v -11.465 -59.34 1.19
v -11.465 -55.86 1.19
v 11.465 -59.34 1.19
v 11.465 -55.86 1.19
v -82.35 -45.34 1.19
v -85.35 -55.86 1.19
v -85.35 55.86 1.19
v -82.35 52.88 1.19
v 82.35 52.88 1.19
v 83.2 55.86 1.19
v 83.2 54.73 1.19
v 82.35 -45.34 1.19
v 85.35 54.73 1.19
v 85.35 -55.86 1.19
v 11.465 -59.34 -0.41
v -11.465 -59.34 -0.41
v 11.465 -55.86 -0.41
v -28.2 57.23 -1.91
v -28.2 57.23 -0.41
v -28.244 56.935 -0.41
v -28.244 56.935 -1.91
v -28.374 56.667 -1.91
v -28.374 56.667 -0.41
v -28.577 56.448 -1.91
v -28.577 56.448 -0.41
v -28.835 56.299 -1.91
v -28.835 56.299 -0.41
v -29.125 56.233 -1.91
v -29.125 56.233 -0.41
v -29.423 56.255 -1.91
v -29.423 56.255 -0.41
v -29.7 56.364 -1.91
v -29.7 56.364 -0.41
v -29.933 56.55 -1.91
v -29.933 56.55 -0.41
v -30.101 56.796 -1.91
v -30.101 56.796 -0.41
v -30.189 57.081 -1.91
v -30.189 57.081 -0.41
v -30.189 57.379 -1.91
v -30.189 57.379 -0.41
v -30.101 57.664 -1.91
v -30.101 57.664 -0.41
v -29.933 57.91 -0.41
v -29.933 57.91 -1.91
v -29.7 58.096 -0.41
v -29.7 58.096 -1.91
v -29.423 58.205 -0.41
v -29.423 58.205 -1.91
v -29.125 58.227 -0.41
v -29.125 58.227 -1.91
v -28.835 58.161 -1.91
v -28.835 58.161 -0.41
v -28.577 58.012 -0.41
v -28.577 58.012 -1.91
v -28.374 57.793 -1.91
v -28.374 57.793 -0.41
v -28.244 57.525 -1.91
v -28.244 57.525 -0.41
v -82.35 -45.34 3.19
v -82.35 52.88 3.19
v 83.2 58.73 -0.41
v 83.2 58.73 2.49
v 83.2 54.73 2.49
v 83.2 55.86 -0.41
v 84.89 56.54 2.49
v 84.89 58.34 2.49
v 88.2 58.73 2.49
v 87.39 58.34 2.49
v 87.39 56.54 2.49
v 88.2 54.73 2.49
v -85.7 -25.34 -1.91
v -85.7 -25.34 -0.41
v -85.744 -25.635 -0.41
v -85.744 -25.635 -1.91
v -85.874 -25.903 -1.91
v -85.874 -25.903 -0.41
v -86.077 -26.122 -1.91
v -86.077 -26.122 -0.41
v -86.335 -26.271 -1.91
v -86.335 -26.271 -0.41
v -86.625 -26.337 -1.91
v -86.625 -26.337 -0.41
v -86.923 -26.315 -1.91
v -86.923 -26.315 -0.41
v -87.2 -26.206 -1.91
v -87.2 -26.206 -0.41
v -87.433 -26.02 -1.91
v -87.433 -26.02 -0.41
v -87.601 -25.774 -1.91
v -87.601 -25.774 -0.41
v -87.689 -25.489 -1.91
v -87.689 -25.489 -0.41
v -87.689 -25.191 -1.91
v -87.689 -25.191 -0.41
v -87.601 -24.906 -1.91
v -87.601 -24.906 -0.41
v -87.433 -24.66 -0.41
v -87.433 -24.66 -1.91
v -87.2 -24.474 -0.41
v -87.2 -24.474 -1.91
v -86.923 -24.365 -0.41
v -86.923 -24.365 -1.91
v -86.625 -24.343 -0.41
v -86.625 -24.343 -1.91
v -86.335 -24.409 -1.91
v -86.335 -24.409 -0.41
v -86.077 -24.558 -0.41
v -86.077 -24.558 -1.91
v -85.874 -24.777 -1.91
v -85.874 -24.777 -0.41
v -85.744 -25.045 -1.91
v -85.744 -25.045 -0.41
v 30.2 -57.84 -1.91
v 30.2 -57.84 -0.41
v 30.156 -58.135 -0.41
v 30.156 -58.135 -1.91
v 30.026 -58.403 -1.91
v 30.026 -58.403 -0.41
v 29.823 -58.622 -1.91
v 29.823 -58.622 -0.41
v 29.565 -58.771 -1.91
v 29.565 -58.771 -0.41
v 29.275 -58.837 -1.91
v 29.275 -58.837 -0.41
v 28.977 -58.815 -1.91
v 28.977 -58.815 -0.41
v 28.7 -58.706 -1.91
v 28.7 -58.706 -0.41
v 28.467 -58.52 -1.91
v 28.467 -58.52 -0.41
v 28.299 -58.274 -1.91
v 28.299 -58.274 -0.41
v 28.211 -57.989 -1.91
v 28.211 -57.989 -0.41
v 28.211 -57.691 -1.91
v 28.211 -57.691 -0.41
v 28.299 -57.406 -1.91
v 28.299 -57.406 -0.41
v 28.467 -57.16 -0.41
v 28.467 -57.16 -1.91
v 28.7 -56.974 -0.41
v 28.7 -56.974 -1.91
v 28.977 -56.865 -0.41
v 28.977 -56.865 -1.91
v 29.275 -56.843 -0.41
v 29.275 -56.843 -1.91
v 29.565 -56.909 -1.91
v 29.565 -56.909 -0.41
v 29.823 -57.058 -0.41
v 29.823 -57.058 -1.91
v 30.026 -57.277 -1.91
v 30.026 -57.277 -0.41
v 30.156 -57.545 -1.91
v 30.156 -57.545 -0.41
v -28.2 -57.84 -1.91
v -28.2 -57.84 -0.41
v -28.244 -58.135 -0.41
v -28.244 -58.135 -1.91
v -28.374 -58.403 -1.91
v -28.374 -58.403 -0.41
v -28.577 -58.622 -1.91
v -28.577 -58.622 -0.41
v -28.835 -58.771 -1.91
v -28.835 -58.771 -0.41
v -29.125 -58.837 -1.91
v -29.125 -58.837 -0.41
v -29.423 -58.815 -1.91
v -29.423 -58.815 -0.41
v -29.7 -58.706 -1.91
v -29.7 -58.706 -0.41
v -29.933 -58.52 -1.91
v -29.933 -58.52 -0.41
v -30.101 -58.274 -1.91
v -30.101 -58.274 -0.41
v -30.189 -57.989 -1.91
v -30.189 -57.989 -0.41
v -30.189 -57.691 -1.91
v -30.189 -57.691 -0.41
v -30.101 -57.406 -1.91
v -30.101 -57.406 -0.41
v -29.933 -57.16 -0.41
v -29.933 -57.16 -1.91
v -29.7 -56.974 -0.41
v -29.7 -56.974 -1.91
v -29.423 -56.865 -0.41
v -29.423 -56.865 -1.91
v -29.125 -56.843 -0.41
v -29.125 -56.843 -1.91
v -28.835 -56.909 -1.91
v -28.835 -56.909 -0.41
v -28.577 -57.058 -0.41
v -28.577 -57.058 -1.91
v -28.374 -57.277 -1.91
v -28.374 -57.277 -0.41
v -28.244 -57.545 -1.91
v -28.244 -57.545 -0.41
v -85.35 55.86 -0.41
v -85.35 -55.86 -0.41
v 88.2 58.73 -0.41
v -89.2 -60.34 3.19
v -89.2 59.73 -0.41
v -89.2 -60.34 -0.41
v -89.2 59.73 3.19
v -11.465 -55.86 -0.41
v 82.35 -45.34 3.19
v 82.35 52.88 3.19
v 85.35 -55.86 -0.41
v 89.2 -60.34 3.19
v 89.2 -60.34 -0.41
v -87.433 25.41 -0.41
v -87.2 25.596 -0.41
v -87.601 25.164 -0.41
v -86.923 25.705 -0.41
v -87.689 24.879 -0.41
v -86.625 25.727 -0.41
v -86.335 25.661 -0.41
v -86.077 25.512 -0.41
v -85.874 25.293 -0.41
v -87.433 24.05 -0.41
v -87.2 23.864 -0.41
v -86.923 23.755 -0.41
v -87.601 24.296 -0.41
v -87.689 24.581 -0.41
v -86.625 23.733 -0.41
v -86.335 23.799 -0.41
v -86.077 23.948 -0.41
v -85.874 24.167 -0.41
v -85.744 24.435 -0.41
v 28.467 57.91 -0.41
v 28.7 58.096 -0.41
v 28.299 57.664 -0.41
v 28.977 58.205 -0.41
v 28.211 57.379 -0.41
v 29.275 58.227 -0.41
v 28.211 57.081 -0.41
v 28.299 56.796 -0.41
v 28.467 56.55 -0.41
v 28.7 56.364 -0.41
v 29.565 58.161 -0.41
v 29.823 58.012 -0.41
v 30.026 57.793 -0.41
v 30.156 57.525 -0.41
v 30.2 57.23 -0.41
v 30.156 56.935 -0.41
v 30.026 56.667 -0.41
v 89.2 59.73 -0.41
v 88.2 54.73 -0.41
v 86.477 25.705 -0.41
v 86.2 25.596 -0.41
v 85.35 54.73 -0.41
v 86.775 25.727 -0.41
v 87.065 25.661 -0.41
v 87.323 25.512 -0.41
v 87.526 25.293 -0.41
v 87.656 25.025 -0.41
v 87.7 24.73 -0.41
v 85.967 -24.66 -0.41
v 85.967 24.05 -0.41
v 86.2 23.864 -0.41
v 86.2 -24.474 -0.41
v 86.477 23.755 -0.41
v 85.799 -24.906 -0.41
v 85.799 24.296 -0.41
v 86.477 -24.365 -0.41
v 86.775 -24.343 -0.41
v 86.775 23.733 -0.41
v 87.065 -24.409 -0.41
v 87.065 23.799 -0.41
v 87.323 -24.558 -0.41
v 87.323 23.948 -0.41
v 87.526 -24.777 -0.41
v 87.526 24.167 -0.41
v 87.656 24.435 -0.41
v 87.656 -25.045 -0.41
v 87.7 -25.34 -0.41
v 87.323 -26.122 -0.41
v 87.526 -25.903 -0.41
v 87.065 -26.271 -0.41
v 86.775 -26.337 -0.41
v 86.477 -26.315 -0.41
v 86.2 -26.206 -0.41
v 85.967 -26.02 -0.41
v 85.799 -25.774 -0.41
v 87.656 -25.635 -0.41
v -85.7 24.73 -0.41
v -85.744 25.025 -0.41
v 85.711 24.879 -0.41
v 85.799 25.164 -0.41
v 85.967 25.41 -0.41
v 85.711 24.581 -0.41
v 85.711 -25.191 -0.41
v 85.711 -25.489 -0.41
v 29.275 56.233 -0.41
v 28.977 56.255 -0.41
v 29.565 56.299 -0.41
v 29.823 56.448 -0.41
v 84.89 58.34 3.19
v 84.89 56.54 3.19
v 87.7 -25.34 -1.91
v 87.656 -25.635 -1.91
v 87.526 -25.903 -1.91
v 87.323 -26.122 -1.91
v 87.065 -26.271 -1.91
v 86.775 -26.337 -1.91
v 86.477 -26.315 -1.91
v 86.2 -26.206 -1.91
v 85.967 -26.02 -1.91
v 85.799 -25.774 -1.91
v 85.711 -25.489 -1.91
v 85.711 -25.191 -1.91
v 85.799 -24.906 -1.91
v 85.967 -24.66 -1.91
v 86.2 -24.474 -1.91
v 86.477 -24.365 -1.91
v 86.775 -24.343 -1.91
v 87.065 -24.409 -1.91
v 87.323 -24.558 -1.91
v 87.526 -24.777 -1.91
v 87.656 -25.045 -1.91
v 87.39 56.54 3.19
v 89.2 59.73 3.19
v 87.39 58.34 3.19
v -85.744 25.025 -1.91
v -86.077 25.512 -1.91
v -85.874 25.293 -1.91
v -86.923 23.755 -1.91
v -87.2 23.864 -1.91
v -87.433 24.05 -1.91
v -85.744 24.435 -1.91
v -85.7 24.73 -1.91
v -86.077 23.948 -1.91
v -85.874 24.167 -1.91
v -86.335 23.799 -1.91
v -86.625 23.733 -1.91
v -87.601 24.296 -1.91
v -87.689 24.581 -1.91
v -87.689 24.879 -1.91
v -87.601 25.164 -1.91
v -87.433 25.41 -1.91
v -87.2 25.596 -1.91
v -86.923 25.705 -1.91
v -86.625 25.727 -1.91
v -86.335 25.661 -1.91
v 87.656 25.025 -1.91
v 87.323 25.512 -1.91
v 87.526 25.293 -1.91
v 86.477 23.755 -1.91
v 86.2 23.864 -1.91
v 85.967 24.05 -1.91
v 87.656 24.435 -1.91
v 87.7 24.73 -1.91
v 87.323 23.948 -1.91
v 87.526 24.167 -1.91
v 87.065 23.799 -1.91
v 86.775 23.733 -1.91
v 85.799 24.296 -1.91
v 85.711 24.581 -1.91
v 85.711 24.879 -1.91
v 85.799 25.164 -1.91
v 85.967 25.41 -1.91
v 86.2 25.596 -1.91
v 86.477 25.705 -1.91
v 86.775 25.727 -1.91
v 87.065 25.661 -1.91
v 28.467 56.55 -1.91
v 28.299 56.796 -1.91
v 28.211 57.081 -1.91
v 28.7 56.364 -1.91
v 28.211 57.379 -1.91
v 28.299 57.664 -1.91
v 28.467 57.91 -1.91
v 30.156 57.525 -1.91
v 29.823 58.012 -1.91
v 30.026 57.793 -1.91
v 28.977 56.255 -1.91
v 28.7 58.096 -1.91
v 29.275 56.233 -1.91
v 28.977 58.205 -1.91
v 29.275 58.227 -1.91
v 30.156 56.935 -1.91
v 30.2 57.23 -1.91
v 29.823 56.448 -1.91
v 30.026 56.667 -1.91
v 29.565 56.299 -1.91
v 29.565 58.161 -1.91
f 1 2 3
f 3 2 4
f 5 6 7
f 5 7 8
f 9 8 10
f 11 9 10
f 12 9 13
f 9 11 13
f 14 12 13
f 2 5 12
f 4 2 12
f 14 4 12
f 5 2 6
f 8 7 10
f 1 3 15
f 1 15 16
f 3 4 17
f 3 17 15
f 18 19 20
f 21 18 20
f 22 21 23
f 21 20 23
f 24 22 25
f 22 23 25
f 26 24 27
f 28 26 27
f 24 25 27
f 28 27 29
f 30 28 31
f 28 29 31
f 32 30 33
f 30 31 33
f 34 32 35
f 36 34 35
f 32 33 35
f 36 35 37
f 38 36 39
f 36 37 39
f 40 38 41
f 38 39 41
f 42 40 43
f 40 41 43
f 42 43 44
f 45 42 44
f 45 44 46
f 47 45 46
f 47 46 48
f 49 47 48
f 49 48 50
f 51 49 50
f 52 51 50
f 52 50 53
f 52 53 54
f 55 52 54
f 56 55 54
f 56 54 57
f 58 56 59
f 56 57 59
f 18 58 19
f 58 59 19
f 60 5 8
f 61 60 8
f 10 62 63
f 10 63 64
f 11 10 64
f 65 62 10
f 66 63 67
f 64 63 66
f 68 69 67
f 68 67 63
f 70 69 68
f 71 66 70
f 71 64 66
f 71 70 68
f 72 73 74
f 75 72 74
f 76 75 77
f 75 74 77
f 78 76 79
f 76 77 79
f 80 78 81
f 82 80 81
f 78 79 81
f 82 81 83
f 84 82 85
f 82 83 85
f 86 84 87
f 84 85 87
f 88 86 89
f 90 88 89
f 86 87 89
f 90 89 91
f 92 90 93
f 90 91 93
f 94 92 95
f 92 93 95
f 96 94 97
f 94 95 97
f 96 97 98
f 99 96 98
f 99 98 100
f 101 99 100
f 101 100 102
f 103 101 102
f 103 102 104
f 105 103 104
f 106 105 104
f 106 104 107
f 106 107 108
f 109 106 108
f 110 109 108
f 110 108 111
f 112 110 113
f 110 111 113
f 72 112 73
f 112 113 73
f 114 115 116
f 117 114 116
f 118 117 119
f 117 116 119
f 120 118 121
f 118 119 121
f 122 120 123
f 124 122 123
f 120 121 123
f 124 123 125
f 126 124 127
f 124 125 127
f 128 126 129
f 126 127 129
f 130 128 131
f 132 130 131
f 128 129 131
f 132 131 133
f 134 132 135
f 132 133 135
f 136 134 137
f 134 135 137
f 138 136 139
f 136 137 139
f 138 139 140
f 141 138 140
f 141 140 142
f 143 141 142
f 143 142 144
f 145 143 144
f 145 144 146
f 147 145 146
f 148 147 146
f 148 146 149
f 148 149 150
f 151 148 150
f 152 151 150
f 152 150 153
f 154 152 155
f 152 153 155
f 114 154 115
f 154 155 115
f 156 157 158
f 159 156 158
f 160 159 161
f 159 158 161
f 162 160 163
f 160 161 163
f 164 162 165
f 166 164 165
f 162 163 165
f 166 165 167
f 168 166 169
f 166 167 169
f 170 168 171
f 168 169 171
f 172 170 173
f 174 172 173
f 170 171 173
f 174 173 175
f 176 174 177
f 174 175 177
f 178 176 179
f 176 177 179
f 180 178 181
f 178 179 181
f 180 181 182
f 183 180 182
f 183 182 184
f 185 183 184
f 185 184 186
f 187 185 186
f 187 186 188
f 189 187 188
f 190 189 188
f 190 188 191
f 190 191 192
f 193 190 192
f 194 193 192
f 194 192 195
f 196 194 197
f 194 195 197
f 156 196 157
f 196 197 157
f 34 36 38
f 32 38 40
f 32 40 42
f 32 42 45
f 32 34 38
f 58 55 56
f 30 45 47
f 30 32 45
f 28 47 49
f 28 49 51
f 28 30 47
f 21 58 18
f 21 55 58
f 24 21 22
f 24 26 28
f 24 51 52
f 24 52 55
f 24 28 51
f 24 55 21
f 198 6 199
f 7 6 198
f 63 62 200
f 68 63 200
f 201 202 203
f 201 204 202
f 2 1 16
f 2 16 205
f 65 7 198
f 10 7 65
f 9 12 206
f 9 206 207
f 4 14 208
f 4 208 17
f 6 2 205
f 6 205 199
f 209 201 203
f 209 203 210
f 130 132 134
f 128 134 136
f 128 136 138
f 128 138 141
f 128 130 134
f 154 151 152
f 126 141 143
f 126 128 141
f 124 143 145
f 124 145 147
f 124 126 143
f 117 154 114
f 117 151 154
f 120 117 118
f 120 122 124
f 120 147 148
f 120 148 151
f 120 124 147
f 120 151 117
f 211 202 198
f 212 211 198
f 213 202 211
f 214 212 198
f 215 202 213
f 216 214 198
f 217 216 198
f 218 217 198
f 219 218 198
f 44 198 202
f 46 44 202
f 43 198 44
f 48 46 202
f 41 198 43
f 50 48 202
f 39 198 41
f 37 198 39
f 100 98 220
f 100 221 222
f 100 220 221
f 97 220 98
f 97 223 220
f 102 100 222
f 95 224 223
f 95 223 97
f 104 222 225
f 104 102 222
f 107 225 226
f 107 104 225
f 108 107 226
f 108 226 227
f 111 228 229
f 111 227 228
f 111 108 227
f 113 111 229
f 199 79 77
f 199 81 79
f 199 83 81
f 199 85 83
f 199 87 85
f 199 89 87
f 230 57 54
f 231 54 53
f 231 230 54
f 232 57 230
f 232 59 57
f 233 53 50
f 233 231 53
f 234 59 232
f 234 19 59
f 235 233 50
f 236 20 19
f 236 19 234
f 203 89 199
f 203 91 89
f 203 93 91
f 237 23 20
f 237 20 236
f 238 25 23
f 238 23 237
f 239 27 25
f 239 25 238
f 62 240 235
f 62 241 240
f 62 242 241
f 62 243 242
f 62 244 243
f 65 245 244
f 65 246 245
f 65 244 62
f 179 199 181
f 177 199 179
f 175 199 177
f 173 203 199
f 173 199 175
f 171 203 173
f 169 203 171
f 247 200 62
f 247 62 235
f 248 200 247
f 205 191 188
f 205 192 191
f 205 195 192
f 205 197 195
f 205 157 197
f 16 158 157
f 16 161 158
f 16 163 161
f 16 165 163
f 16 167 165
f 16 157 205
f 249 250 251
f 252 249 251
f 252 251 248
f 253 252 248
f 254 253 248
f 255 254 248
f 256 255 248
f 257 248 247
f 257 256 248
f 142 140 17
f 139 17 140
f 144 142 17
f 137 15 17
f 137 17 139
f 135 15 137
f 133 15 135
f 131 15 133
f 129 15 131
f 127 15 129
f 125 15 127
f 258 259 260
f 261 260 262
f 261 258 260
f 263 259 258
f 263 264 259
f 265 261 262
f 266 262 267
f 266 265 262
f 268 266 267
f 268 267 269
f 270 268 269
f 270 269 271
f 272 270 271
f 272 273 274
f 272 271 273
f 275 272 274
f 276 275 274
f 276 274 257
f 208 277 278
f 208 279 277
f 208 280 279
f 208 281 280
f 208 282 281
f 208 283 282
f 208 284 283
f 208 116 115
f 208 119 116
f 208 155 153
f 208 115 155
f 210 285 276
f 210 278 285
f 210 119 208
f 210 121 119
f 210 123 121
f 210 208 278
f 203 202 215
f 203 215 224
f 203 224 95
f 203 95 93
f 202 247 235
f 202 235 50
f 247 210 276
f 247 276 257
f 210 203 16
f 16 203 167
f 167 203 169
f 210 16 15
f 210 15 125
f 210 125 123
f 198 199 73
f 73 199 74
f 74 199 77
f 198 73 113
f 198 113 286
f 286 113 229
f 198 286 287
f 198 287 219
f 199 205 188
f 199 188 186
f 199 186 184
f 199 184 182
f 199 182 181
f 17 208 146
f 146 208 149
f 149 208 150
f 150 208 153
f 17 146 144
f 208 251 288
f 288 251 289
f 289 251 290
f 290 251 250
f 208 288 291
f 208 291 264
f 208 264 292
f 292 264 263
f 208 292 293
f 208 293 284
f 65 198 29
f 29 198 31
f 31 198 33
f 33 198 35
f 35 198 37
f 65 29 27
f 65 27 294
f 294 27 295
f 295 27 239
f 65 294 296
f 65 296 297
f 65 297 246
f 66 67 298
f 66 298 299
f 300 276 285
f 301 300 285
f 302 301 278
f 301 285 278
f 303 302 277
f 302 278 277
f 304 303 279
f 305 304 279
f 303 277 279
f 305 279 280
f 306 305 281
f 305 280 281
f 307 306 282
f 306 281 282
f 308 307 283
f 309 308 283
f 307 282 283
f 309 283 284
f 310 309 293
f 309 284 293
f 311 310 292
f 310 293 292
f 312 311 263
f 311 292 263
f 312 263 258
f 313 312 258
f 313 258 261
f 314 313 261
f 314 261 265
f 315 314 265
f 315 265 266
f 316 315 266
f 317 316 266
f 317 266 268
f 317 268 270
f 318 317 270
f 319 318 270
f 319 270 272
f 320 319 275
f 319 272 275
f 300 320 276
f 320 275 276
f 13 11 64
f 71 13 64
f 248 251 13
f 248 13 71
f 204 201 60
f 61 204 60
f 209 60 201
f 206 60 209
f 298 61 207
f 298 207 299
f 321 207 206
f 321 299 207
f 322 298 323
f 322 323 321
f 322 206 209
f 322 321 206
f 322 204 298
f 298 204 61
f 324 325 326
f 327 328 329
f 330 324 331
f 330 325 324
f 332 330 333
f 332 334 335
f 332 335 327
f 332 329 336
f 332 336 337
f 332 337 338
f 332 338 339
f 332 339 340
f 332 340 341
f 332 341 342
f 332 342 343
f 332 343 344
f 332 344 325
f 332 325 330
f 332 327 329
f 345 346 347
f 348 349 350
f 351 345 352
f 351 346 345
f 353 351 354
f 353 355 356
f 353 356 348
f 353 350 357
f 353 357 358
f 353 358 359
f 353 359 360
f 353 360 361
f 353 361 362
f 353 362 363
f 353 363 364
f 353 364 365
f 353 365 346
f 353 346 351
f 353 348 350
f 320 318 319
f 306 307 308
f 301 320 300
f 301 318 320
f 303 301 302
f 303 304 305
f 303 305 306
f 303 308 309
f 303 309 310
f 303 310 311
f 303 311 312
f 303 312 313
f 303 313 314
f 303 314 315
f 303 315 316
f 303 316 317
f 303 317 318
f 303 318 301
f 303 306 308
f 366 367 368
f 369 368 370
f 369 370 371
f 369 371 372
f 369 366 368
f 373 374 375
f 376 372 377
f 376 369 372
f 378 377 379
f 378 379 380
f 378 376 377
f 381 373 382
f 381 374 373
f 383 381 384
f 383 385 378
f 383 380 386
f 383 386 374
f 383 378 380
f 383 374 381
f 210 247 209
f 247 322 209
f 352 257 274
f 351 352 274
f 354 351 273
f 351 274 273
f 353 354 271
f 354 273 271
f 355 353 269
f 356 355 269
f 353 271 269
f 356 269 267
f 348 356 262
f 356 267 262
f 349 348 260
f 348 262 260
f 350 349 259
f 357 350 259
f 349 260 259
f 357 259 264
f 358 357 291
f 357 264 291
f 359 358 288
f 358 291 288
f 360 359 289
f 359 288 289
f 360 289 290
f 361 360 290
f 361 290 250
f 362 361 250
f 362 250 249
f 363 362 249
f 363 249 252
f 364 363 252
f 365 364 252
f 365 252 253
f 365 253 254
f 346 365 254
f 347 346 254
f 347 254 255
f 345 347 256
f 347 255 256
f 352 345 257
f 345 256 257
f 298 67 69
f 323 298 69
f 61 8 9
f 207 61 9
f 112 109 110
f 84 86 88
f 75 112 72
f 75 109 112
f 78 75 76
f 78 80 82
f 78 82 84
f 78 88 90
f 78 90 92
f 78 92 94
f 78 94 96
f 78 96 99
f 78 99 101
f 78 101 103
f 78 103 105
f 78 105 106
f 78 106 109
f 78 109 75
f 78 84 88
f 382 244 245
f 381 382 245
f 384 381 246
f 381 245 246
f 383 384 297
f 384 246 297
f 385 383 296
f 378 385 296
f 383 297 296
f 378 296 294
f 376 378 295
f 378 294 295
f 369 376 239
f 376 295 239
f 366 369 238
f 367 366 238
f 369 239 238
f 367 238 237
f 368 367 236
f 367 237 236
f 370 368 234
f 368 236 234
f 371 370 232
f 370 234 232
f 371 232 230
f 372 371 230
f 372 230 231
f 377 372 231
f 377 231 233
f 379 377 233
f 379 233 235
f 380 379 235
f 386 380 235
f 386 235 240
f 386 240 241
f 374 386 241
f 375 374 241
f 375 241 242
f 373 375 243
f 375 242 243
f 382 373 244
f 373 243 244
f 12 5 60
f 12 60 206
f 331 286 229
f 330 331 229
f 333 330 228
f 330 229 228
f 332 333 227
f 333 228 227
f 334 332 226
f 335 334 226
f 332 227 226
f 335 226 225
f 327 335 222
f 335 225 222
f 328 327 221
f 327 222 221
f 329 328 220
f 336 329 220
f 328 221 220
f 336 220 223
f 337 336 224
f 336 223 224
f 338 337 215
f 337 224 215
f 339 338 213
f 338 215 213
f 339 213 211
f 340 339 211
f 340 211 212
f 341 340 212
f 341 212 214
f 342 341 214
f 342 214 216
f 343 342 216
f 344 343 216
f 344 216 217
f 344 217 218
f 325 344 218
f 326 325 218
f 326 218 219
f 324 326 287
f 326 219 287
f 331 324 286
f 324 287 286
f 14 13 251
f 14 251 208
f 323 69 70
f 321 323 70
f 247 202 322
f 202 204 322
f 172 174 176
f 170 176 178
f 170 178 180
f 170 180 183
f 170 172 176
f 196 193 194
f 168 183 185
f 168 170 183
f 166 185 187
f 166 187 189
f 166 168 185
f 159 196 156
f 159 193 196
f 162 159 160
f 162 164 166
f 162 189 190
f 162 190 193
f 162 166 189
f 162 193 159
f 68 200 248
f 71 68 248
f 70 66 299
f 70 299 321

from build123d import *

# Parameters (mm, degrees)
SKETCH001_W     = 178.4
SKETCH001_H     = 120.07
SKETCH001_W_2   = 164.7
SKETCH001_H_2   = 98.22
PAD_DEPTH       = 2
SKETCH_W        = 178.4
SKETCH_H        = 120.07
PAD001_DEPTH    = 1.6
SKETCH009_W     = 5
SKETCH009_H     = 4
POCKET_DEPTH    = 2.9
SKETCH010_W     = 2.5
SKETCH010_H     = 1.8
POCKET001_DEPTH = 5
SKETCH011_R     = 1
PAD009_DEPTH    = 1.5


with BuildPart() as part:
    # Sketch001 (on Face45 of Binder) → Pad (new body)
    with BuildSketch(Plane.XY.offset(1.19)):
        with Locations((0, -0.305)):
            Rectangle(SKETCH001_W, SKETCH001_H)
        with Locations((0, 3.77)):
            Rectangle(SKETCH001_W_2, SKETCH001_H_2, mode=Mode.SUBTRACT)
    extrude(amount=PAD_DEPTH)

    # Sketch (on Face9 of Pad) → Pad001 (join)
    with BuildSketch(Plane(origin=(0, 0, 1.19), x_dir=(1, 0, 0), z_dir=(0, 0, -1))):
        with Locations((0, 0.305)):
            Rectangle(SKETCH_W, SKETCH_H)
        Polygon((-85.35, 55.86), (-85.35, -55.86), (85.35, -55.86), (85.35, 55.86), (11.4649, 55.86), (11.4649, 59.34), (-11.4649, 59.34), (-11.4649, 55.86), align=None, mode=Mode.SUBTRACT)
    extrude(amount=PAD001_DEPTH)

    # Sketch009 (on Face1 of Pad001) → Pocket (cut)
    with BuildSketch(Plane(origin=(0, 0, -0.41), x_dir=(1, 0, 0), z_dir=(0, 0, -1))):
        with Locations((85.7, -56.73)):
            Rectangle(SKETCH009_W, SKETCH009_H)
    extrude(amount=-POCKET_DEPTH, mode=Mode.SUBTRACT)

    # Sketch010 (on Face19 of Pocket) → Pocket001 (cut)
    with BuildSketch(Plane(origin=(0, 0, 1.19), x_dir=(1, 0, 0), z_dir=(0, 0, -1))):
        with Locations((86.14, -57.44)):
            Rectangle(SKETCH010_W, SKETCH010_H)
    extrude(amount=-POCKET001_DEPTH, mode=Mode.SUBTRACT)

    # Sketch011 (on Face1 of Pocket001) → Pad009 (join)
    with BuildSketch(Plane(origin=(0, 0, -0.41), x_dir=(1, 0, 0), z_dir=(0, 0, -1))):
        with Locations((-29.2, 57.84)):
            Circle(SKETCH011_R)
        with Locations((29.2, 57.84)):
            Circle(SKETCH011_R)
        with Locations((-29.2, -57.23)):
            Circle(SKETCH011_R)
        with Locations((29.2, -57.23)):
            Circle(SKETCH011_R)
        with Locations((-86.7, -24.73)):
            Circle(SKETCH011_R)
        with Locations((-86.7, 25.34)):
            Circle(SKETCH011_R)
        with Locations((86.7, 25.34)):
            Circle(SKETCH011_R)
        with Locations((86.7, -24.73)):
            Circle(SKETCH011_R)
    extrude(amount=PAD009_DEPTH)


solid = part.part
